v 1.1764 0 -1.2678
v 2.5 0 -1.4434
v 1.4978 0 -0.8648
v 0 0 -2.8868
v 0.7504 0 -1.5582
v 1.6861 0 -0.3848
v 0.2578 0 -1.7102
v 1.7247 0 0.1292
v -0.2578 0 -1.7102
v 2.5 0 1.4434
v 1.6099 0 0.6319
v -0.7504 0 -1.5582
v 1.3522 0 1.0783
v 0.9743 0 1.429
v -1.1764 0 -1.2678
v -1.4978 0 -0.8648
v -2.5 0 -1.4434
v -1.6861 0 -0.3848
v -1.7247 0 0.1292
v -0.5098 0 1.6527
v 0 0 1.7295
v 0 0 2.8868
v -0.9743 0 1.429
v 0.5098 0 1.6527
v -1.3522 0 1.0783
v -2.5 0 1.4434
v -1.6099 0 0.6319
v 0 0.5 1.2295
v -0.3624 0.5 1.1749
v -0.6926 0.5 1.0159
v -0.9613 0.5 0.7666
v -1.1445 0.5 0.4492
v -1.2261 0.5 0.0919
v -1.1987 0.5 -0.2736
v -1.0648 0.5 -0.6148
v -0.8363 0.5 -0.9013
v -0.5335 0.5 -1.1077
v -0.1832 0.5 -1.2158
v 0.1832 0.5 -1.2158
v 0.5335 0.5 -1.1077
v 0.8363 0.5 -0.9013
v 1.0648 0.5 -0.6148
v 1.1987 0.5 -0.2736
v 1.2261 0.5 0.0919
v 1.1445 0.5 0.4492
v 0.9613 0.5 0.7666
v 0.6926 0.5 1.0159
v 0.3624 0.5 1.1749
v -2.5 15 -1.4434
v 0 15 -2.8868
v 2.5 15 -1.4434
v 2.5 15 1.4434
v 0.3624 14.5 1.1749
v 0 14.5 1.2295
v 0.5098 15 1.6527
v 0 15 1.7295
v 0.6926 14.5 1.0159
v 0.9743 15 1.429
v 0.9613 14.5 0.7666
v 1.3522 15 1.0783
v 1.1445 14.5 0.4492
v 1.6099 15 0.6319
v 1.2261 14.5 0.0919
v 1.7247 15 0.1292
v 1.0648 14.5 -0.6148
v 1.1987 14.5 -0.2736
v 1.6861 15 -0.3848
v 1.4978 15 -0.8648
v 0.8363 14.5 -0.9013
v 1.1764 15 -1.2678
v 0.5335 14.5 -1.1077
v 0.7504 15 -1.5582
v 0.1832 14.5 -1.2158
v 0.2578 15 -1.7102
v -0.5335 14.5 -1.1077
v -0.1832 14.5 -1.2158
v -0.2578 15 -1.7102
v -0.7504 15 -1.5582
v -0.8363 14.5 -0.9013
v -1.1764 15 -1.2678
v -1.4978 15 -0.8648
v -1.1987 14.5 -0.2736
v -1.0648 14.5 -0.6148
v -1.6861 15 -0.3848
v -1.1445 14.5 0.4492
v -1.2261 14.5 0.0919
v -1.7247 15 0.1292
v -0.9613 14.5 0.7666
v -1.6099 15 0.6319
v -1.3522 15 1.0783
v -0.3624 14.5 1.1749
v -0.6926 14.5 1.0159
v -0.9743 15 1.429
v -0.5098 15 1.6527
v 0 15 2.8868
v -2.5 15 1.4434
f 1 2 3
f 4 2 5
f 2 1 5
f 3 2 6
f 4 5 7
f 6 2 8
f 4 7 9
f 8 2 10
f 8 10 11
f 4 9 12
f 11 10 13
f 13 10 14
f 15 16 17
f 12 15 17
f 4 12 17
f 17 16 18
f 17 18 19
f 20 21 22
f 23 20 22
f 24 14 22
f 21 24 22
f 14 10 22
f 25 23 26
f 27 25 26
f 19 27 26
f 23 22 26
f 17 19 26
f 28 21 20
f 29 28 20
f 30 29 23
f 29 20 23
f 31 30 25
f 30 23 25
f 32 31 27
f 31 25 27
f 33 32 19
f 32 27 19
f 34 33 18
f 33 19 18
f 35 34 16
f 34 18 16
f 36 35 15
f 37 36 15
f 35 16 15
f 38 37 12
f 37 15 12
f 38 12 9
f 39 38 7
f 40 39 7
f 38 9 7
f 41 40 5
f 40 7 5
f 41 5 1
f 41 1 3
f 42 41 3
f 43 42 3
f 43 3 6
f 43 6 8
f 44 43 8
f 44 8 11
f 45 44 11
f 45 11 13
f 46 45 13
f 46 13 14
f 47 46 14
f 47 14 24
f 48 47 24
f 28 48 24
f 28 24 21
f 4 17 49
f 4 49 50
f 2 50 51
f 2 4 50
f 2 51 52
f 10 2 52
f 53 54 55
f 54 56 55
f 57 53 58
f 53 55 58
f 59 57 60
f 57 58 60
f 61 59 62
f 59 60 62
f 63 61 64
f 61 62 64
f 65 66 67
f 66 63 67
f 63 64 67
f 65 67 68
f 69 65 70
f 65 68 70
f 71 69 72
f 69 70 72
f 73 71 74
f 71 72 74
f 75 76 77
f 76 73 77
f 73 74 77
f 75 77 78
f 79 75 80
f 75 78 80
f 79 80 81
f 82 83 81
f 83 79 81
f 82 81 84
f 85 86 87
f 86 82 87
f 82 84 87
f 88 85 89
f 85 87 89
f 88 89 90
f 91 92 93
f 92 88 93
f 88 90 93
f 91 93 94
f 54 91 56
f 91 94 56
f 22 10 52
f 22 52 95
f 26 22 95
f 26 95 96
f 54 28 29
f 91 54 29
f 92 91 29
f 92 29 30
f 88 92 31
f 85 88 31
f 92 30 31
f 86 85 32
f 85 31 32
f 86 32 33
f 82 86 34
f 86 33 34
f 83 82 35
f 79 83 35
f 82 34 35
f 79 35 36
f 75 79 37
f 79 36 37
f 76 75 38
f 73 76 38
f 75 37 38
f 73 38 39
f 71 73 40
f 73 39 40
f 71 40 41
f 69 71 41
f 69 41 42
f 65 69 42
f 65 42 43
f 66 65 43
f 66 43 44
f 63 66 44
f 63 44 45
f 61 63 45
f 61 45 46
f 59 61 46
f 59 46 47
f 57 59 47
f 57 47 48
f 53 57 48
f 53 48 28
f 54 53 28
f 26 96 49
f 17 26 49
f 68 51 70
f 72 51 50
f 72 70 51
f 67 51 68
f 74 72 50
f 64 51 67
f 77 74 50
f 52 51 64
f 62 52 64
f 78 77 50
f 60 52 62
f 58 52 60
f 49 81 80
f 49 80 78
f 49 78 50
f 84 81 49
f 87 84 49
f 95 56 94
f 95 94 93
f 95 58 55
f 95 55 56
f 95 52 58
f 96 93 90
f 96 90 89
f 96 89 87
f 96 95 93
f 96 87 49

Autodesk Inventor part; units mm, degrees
ref_plane "YZ Plane" through (0, 0, 0) normal (1, 0, 0) x (0, 1, 0)
ref_plane "XZ Plane" through (0, 0, 0) normal (0, 1, 0) x (-1, 0, 0)
ref_plane "XY Plane" through (0, 0, 0) normal (0, 0, 1) x (1, 0, 0)
sketch "Sketch1" plane through (0, 0, 0) normal (0, 1, 0) x (-1, 0, 0)
  line L0 (0, 0) -> (2.5, 0)
  line L1 (2.5, -1.4434) -> (0, -2.8868)
  line L2 (0, -2.8868) -> (-2.5, -1.4434)
  line L3 (-2.5, -1.4434) -> (-2.5, 1.4434)
  line L4 (-2.5, 1.4434) -> (0, 2.8868)
  line L5 (0, 2.8868) -> (2.5, 1.4434)
  line L6 (2.5, 1.4434) -> (2.5, -1.4434)
  dimension "d0" = 2.5
extrude "Extrusion1" add sketch "Sketch1" along normal blind 15
sketch "Sketch2" plane through (0, 15, 0) normal (0, 1, 0) x (1, 0, 0)
  point P0 (0, 0)
hole "Hole1" at (0, 15, 0) direction (0, -1, 0) diameter 2.459 end through all thread size "M3x0.5" class "6H" standard "ANSI Metric M Profile"
chamfer "Chamfer1" distance 0.5 angle 45 2 edges at (0, 15, -1.2295) (0, 0, -1.2295)
properties part number "18mm Standoff" material "Aluminum 6061"
